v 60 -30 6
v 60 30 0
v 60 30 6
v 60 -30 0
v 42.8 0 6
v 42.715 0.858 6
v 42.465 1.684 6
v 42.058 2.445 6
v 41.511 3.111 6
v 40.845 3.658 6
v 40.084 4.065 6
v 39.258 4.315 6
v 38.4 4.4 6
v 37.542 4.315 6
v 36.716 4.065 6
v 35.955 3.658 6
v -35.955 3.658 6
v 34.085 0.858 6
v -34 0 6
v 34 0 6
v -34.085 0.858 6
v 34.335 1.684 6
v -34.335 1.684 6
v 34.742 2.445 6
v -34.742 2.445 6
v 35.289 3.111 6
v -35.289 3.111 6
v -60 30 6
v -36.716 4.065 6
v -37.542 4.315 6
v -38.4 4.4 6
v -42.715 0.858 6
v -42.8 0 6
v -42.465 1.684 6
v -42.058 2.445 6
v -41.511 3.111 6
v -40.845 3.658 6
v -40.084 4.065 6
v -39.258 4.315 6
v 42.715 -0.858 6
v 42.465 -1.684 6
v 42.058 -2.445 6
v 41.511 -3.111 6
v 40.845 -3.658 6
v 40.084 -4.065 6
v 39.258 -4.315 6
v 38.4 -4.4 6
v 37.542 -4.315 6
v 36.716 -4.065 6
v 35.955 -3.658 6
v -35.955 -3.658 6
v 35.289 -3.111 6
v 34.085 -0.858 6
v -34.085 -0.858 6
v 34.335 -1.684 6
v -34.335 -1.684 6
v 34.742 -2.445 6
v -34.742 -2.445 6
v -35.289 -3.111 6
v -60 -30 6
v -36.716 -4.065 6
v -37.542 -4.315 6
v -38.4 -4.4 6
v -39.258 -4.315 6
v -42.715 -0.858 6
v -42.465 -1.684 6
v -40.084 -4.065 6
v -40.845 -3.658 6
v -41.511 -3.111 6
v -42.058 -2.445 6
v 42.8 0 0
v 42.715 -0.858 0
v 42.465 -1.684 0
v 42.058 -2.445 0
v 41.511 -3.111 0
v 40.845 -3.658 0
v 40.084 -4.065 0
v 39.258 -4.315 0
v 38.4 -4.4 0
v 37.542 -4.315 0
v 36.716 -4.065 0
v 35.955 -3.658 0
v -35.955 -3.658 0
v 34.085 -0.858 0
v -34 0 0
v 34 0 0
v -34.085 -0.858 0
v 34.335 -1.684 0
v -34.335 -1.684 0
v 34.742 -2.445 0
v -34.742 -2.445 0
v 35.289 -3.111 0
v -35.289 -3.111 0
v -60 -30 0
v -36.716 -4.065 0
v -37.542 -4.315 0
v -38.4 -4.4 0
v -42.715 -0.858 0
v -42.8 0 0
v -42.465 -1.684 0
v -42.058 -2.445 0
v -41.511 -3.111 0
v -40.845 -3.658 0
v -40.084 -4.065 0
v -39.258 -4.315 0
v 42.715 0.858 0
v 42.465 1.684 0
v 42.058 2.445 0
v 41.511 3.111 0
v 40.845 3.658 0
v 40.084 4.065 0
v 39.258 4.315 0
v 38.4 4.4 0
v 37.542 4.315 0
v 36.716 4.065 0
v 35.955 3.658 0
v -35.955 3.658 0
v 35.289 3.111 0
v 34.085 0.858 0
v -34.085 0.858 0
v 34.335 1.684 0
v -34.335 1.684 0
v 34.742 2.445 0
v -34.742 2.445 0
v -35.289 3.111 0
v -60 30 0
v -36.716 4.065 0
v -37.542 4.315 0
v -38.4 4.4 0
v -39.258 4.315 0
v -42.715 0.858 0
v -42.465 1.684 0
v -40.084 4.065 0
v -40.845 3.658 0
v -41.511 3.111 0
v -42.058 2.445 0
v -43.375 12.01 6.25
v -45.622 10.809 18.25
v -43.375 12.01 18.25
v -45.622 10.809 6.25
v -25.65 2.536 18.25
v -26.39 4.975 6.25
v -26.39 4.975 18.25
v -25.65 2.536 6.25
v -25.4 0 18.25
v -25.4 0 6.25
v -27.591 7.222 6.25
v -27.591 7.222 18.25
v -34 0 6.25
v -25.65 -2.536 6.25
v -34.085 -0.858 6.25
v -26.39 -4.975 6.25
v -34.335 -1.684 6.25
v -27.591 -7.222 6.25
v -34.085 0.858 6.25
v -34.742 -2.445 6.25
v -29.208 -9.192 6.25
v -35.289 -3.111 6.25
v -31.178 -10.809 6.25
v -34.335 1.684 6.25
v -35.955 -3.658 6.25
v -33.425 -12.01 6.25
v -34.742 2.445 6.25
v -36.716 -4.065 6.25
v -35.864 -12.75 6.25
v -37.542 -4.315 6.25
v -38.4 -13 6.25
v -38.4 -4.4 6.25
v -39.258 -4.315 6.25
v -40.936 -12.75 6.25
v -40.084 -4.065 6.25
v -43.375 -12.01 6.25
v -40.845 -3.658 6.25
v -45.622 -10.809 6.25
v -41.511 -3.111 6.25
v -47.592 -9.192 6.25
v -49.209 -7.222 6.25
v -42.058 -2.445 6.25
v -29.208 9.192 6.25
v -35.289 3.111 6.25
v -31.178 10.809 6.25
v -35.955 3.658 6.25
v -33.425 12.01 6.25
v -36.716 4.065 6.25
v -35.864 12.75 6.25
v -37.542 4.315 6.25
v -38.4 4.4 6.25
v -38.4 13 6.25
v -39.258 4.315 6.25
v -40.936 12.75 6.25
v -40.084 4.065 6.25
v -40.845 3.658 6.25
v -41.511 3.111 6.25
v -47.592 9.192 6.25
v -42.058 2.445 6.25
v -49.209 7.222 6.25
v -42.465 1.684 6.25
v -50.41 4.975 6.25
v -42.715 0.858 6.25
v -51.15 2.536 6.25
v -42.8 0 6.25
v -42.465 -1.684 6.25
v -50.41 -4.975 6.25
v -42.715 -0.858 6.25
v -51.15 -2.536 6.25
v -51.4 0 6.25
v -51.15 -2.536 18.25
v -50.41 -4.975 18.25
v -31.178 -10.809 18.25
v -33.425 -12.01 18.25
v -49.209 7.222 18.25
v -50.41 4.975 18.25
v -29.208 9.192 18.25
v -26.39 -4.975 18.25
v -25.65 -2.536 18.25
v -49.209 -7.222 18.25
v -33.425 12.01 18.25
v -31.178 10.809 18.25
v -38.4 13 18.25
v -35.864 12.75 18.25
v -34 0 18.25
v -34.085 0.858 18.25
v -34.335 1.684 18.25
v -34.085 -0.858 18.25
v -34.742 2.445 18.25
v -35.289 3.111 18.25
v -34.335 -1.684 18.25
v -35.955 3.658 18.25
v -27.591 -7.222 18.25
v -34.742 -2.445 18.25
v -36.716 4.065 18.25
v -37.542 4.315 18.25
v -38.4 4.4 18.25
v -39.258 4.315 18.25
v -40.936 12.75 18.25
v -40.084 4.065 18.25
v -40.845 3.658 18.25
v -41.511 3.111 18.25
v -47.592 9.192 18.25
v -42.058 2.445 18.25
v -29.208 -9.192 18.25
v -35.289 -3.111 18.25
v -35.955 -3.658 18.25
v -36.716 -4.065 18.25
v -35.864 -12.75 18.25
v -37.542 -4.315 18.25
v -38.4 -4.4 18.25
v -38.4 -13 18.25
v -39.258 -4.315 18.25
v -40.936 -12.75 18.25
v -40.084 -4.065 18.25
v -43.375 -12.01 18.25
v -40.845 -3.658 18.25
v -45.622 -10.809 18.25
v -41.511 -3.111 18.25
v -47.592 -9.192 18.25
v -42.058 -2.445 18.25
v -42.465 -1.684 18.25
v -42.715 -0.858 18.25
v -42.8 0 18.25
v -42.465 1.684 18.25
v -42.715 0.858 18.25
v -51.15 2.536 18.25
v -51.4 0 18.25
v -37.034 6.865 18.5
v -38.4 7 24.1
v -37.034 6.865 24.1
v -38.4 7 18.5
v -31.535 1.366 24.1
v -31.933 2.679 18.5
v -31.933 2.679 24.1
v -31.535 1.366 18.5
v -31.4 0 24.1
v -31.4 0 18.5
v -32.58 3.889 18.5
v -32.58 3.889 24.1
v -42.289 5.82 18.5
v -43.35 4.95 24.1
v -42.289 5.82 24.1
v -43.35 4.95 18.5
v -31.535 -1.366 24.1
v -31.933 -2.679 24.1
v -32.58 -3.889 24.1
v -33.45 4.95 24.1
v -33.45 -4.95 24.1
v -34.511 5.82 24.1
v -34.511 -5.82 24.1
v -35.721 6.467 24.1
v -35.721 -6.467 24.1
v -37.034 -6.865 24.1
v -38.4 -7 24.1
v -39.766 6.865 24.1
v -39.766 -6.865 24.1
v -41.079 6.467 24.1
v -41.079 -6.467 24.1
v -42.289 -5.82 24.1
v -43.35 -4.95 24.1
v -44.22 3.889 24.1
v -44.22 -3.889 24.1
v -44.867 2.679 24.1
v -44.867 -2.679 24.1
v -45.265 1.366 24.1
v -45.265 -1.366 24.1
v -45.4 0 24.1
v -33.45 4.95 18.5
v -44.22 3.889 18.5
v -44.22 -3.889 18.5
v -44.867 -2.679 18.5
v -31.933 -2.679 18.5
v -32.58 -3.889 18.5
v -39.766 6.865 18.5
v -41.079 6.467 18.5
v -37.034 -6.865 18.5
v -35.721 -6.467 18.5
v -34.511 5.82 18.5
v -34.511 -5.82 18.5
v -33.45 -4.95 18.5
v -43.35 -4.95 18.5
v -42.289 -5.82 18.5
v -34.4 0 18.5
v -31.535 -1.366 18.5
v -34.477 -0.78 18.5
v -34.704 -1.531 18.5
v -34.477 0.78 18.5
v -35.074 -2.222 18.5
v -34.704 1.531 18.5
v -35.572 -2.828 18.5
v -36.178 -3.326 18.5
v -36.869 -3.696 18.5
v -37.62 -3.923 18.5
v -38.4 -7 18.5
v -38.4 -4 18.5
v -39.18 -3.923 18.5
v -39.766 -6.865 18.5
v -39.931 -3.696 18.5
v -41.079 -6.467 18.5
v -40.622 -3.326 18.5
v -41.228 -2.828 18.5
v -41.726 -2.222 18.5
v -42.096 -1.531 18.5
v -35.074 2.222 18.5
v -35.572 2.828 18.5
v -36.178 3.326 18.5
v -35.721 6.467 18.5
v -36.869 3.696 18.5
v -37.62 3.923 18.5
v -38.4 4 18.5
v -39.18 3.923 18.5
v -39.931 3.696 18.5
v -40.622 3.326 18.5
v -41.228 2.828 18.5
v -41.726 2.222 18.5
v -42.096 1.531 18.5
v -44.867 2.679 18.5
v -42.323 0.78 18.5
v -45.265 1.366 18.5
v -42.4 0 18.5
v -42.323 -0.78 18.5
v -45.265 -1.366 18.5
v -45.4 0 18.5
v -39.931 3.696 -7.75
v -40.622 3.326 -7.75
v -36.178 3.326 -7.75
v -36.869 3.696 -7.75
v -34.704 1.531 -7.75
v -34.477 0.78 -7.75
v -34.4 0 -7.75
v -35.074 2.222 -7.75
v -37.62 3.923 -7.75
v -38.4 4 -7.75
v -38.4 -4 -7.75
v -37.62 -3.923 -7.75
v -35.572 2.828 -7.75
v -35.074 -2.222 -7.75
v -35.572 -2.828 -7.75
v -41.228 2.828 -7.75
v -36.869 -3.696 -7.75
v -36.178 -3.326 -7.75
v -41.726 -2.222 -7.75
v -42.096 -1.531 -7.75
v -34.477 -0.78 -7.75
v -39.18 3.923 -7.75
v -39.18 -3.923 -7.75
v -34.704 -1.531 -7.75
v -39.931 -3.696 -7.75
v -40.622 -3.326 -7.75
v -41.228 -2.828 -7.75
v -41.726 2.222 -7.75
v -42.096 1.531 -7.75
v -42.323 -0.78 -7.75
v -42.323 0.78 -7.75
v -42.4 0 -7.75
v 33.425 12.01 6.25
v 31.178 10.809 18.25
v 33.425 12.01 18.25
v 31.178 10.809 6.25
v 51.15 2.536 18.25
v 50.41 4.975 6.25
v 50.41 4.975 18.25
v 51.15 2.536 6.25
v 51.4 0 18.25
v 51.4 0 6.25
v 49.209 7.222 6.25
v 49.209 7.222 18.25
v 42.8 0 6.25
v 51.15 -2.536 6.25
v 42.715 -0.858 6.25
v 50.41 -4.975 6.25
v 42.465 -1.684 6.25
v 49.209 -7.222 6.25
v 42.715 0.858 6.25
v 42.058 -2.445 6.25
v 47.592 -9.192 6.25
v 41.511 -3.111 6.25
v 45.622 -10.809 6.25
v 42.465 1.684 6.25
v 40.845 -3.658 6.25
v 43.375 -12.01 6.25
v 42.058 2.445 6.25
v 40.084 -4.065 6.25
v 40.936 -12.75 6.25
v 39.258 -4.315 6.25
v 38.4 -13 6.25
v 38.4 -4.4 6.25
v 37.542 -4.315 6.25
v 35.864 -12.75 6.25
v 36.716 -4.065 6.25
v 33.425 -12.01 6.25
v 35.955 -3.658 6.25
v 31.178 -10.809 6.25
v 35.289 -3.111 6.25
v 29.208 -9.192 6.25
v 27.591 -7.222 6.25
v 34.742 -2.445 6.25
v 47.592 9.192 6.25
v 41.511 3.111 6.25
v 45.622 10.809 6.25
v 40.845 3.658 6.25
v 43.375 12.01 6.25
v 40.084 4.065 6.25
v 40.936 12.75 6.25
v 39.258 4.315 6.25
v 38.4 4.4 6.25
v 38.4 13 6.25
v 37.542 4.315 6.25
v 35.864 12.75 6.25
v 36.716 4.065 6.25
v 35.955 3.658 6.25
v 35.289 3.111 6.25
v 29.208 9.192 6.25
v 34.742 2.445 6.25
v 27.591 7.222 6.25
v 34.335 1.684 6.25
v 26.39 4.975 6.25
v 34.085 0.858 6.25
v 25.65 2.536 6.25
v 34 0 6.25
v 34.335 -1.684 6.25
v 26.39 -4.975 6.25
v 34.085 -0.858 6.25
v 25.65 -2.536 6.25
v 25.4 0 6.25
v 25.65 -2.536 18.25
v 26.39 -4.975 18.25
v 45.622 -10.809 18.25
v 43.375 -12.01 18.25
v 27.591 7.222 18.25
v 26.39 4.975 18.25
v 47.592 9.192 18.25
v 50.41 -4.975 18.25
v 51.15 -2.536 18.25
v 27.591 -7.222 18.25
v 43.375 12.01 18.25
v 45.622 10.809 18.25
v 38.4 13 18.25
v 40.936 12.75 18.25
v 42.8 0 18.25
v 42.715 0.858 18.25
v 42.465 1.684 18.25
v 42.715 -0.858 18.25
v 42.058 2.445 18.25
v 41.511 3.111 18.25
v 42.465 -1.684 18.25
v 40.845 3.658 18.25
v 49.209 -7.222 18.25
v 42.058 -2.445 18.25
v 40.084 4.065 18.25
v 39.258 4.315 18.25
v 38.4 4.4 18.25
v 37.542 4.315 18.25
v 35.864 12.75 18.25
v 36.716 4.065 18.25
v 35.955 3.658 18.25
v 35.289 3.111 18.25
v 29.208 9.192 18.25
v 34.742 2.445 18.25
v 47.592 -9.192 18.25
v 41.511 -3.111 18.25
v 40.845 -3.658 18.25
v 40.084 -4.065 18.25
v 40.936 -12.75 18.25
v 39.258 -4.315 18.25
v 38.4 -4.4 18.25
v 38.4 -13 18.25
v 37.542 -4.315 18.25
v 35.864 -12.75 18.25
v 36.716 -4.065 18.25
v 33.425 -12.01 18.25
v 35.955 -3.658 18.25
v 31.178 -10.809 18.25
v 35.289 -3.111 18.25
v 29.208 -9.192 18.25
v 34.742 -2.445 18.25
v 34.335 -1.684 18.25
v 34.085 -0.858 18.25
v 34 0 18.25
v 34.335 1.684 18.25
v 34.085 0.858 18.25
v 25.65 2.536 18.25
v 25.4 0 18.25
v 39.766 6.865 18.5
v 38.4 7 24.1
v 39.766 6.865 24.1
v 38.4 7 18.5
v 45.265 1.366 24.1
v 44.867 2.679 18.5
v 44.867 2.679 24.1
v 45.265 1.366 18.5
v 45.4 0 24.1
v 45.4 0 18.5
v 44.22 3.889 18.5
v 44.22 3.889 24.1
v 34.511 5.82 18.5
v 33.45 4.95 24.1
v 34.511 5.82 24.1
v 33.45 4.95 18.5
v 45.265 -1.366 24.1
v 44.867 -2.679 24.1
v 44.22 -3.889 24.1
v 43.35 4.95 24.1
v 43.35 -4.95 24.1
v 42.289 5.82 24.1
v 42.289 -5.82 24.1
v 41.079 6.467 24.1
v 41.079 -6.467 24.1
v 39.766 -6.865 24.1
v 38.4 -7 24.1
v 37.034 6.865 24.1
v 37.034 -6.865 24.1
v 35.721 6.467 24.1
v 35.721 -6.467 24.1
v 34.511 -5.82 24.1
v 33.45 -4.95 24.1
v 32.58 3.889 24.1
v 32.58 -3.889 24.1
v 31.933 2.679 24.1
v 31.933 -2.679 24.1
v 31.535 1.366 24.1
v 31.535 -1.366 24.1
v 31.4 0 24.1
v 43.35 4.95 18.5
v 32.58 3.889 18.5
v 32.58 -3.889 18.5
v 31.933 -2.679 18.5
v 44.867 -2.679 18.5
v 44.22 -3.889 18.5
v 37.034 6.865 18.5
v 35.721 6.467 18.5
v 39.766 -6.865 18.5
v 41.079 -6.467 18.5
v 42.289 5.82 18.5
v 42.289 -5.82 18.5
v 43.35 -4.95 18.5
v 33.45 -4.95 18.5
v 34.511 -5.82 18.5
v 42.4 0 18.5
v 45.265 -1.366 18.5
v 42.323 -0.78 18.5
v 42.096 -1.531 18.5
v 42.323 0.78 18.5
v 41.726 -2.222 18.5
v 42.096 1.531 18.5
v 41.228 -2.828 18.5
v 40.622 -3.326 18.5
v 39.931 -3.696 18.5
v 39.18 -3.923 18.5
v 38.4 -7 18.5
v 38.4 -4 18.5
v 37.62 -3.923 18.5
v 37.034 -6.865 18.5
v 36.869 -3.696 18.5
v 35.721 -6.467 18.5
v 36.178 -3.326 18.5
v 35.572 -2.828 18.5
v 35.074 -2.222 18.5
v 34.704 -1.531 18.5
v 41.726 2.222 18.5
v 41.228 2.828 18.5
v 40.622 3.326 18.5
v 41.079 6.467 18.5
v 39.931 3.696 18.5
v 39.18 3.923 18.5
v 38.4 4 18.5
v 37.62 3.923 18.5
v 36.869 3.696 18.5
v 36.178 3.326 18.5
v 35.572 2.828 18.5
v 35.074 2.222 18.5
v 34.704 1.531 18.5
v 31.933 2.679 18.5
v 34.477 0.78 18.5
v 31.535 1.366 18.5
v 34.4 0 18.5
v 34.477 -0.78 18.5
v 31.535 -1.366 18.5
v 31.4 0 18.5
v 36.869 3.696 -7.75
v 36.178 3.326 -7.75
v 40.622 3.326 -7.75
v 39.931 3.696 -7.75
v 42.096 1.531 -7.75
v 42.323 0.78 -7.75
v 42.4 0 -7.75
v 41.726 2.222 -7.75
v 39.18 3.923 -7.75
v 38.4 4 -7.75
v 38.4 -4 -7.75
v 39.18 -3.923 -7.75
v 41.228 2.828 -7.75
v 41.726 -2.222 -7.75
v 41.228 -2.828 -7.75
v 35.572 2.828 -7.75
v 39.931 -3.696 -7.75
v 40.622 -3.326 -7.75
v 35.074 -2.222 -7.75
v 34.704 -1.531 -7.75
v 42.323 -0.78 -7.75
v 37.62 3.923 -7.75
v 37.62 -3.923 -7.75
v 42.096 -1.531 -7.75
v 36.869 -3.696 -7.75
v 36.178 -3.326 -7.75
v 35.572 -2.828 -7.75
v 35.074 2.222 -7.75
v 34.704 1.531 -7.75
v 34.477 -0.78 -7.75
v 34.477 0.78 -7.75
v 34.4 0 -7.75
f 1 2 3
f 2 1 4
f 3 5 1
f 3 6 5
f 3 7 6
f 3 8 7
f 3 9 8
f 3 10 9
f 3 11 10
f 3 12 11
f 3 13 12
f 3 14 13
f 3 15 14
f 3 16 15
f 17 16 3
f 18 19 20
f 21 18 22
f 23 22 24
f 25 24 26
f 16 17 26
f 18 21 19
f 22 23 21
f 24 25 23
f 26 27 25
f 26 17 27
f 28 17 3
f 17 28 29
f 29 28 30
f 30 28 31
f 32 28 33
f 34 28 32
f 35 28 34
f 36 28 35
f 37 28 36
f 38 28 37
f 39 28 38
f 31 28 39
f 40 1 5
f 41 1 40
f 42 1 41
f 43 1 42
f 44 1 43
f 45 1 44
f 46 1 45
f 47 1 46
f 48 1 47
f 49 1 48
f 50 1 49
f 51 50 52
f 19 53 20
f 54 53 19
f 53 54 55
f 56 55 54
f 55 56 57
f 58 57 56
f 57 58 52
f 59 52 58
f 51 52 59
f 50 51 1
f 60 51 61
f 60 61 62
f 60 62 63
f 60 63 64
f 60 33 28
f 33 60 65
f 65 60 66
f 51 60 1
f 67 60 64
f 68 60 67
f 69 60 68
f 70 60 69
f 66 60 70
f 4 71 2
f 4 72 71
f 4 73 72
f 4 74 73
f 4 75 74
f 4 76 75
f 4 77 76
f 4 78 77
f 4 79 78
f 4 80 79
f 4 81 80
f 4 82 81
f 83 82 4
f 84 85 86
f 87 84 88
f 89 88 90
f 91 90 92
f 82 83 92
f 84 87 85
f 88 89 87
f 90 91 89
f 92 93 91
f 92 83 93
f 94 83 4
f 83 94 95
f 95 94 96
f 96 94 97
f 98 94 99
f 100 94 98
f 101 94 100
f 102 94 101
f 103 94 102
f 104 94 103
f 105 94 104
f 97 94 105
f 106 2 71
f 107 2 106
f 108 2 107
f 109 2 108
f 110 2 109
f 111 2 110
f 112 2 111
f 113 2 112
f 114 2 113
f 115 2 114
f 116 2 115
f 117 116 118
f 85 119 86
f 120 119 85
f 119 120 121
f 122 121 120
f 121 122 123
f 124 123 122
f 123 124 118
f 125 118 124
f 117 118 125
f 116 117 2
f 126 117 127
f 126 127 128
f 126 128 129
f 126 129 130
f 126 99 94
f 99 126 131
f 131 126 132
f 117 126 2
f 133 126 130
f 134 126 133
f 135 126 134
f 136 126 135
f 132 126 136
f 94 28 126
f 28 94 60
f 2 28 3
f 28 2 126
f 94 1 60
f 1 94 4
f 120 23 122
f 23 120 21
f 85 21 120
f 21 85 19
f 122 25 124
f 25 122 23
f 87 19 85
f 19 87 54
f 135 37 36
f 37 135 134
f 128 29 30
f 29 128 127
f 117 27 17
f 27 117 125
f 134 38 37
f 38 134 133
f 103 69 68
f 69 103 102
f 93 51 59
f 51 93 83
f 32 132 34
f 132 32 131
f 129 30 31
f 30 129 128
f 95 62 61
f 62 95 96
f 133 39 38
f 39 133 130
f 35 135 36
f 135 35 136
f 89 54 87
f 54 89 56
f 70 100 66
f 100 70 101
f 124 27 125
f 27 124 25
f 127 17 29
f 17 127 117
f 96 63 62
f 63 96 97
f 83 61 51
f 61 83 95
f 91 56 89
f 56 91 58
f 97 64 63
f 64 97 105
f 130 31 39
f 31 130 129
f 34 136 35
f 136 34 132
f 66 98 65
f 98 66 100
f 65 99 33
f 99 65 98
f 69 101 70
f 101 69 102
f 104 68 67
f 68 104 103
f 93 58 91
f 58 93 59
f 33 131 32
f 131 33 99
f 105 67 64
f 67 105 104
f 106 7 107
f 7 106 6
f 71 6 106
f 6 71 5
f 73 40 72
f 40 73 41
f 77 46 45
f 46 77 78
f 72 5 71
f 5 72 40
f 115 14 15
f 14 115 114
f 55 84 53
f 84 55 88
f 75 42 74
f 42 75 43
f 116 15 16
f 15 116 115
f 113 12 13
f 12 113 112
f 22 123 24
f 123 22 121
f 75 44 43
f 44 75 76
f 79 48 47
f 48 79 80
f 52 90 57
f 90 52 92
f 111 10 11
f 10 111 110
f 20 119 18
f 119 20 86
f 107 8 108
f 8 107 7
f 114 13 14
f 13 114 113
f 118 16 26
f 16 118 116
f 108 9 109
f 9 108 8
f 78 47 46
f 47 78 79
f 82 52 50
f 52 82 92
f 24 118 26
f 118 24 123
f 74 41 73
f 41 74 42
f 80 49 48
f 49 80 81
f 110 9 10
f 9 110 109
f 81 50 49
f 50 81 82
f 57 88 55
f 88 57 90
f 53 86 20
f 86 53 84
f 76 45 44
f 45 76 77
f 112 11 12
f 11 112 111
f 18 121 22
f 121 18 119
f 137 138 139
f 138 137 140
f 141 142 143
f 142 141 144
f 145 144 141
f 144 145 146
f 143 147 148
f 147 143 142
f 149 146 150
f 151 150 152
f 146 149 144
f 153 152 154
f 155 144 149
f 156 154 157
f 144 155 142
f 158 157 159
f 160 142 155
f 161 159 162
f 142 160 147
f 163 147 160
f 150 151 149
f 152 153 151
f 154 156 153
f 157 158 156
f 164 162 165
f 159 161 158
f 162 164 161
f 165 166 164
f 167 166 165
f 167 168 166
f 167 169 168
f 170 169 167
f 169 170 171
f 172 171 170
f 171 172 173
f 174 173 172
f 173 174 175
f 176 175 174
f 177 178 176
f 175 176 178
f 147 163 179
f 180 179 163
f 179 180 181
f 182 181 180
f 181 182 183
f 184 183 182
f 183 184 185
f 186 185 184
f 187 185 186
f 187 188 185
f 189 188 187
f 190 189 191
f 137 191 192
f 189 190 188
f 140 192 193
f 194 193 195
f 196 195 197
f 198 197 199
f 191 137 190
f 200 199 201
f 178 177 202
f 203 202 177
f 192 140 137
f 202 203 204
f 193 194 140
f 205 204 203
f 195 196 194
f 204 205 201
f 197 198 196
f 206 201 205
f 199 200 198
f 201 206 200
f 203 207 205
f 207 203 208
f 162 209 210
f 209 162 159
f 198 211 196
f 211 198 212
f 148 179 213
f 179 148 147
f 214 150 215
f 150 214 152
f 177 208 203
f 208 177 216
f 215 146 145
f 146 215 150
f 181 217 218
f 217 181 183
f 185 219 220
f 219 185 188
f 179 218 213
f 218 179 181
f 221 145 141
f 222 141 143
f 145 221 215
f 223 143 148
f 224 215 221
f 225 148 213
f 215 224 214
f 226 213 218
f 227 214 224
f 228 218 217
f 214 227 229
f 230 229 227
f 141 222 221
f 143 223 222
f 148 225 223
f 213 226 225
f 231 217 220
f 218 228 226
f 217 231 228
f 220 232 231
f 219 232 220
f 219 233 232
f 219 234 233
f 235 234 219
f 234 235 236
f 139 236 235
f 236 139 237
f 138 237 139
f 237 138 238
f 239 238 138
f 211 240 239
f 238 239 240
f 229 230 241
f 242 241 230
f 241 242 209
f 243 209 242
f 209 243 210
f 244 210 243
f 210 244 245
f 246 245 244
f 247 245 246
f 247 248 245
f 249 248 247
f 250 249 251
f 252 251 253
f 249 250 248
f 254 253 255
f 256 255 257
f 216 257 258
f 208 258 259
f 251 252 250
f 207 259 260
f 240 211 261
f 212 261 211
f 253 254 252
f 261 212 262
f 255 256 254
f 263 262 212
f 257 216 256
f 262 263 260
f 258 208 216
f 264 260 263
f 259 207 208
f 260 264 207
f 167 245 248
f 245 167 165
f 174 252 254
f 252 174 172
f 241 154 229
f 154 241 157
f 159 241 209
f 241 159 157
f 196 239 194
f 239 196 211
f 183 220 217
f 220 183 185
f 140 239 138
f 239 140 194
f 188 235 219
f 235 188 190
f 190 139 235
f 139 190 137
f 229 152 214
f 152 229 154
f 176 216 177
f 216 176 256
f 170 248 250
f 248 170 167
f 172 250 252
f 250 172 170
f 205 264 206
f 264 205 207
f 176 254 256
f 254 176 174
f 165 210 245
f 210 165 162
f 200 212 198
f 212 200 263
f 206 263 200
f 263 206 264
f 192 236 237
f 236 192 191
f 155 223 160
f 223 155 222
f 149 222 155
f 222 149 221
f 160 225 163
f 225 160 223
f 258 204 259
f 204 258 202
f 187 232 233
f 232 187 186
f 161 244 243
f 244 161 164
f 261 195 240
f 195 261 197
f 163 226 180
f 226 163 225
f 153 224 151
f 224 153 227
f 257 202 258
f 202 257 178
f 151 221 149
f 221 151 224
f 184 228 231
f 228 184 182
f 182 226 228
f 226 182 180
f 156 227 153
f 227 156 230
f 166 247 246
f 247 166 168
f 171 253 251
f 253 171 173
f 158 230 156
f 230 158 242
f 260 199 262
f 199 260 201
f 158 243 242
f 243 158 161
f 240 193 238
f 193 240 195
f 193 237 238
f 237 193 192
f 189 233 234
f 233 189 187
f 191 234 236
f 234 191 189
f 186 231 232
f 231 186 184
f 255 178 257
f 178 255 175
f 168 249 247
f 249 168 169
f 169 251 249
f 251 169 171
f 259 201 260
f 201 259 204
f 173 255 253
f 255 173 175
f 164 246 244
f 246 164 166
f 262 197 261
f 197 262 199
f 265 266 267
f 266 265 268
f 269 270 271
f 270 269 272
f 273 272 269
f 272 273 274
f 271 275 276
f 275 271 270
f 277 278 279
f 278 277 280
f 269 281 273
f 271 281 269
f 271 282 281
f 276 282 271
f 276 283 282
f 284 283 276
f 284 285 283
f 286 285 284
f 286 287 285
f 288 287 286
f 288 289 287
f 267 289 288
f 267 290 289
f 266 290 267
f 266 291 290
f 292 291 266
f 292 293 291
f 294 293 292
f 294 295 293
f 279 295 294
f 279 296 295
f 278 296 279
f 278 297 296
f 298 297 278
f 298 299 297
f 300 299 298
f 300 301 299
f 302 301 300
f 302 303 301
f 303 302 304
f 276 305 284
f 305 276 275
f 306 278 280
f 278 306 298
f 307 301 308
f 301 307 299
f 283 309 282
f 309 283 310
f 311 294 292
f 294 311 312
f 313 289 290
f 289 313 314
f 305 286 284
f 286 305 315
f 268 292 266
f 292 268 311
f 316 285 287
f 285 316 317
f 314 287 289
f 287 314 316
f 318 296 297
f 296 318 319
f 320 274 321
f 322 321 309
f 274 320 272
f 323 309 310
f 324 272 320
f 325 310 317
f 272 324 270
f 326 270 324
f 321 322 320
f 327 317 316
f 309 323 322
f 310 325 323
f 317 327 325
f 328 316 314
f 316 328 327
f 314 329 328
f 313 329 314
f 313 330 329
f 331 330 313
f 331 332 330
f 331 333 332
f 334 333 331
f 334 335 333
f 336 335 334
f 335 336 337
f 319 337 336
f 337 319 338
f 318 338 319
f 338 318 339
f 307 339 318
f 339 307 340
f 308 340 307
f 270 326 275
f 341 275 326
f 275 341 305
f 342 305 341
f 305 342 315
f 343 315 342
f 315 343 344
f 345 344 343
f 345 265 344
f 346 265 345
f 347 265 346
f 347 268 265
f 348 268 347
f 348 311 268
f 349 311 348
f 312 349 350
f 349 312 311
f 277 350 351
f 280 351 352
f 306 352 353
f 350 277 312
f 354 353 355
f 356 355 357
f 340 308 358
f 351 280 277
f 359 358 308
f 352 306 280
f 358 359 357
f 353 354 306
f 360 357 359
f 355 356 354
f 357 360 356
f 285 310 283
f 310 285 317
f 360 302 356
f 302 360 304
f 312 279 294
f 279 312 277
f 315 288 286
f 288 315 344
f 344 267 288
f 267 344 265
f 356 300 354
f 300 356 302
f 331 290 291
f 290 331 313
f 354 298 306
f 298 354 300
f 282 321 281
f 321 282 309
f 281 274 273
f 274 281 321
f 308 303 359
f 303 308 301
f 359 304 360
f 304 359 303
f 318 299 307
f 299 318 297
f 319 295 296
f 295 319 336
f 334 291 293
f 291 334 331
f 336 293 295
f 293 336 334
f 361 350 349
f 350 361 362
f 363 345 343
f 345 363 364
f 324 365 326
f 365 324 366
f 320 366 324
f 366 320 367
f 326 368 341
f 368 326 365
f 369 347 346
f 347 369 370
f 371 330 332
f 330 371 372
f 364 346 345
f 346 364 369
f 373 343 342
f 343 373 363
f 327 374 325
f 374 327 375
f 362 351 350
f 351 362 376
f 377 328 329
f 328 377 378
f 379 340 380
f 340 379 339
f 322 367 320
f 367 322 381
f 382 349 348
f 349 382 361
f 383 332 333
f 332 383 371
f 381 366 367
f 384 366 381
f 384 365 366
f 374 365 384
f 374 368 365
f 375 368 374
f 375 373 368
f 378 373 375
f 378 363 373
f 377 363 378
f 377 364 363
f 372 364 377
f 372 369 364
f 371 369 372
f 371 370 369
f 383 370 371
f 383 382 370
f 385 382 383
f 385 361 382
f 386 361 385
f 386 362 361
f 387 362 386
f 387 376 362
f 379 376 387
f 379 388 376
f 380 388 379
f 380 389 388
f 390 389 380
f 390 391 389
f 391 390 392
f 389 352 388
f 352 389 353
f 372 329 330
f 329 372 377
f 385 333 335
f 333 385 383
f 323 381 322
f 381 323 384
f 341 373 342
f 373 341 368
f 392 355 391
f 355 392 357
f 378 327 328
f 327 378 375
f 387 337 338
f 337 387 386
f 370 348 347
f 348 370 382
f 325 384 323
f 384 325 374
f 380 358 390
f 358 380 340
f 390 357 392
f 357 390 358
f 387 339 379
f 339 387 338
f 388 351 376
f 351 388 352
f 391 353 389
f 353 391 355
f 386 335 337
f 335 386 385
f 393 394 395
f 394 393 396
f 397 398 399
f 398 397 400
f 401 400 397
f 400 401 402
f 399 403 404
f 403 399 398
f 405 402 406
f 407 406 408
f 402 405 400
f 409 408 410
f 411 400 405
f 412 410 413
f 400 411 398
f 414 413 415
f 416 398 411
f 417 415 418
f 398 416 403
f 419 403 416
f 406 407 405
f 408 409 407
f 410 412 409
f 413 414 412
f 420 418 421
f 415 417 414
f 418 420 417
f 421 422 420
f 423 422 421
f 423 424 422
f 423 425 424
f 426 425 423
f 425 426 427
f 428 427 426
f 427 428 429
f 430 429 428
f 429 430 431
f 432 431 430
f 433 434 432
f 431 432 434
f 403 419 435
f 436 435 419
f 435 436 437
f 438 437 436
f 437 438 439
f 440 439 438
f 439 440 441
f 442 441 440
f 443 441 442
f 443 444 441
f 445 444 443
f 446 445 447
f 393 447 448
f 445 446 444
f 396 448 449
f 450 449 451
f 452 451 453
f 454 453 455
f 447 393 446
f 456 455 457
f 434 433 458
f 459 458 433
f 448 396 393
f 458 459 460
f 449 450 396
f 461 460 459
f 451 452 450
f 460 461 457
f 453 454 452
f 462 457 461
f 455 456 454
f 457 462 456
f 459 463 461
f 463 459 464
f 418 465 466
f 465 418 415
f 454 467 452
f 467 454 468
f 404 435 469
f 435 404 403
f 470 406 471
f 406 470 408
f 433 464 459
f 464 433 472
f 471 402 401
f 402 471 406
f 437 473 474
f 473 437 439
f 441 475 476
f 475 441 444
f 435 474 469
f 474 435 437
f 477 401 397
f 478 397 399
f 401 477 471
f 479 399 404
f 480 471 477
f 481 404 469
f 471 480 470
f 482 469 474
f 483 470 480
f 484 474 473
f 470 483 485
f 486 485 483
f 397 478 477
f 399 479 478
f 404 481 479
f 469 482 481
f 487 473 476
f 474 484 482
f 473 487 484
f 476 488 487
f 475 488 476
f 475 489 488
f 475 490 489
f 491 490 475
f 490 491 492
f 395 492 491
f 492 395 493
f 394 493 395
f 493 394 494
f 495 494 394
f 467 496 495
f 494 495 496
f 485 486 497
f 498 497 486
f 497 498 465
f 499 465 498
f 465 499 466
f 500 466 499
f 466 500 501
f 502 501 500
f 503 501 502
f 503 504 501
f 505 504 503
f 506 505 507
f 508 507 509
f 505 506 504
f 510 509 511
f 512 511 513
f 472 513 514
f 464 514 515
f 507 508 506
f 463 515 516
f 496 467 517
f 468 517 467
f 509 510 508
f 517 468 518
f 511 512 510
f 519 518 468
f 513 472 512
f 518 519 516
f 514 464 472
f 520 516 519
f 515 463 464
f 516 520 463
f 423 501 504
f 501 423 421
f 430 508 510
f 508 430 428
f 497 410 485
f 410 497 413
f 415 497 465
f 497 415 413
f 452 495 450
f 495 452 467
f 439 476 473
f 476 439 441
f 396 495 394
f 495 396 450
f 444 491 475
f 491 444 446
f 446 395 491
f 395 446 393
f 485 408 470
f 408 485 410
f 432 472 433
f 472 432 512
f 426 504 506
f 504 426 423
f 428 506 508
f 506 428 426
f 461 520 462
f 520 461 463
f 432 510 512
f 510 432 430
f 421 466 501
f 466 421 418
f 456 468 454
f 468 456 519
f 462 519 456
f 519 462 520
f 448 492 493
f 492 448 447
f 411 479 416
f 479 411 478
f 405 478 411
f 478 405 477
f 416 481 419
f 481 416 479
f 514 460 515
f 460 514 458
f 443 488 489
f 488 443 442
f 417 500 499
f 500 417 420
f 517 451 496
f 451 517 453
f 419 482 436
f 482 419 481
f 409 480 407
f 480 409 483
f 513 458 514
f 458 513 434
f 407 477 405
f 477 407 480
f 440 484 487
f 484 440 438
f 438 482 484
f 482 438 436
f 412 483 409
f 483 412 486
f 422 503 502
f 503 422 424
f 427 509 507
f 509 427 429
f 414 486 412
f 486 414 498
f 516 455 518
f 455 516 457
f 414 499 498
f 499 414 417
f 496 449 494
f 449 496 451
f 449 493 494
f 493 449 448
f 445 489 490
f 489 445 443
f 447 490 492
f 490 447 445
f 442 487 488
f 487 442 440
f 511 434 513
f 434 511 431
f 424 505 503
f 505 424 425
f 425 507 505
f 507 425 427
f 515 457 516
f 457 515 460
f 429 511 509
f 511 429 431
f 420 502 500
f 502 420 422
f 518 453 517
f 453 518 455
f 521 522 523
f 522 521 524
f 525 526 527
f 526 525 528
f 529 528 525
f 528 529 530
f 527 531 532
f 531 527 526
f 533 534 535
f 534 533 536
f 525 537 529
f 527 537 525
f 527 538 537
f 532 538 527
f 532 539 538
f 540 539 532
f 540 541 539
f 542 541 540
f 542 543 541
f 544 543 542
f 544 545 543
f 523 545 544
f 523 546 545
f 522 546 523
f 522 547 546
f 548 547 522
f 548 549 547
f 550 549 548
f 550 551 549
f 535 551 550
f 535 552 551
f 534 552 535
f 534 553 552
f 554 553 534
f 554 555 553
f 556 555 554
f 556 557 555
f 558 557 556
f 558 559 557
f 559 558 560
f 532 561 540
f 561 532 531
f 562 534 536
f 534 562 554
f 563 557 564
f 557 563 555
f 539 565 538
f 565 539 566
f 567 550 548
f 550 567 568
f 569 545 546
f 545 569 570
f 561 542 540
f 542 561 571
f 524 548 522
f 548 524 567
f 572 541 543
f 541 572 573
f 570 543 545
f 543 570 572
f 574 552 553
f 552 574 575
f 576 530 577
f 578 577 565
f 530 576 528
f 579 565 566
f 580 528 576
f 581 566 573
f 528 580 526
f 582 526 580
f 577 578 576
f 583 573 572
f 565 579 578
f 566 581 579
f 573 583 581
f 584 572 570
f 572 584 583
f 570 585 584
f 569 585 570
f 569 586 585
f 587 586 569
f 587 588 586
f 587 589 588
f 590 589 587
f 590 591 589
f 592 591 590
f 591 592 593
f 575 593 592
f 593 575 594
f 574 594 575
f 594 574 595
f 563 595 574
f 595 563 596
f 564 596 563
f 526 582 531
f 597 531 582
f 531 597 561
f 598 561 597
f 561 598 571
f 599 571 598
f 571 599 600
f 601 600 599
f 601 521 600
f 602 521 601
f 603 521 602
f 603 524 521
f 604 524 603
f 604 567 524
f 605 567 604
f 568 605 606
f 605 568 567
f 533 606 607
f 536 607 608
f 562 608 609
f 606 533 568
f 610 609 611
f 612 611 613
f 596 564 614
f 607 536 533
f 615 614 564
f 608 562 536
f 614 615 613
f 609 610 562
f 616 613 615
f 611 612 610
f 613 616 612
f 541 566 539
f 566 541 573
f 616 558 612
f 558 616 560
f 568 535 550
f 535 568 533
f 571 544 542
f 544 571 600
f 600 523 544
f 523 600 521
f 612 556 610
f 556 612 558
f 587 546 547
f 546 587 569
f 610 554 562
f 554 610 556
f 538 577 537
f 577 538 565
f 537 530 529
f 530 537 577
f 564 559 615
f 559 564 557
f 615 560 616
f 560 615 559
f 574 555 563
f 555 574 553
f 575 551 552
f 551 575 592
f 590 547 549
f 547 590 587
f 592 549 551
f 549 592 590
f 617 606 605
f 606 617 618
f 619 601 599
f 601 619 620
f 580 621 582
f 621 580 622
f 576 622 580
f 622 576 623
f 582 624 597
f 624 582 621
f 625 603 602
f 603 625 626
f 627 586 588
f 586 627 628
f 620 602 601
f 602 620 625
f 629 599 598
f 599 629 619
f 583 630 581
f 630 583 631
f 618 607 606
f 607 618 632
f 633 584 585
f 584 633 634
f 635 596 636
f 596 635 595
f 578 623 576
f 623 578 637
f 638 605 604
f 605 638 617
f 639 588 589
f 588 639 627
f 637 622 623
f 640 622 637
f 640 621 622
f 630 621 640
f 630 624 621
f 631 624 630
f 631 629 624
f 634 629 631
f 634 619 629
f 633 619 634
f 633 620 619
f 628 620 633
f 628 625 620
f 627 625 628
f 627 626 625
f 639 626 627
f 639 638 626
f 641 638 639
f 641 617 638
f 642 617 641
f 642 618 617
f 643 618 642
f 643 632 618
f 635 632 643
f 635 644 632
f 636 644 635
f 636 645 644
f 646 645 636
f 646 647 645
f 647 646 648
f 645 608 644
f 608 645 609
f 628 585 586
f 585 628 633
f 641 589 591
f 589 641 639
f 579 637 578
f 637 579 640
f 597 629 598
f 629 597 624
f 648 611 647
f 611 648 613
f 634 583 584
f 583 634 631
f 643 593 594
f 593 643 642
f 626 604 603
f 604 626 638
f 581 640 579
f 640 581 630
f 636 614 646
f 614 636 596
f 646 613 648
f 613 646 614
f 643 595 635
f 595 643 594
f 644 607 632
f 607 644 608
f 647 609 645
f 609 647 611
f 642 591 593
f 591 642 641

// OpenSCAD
$fn = 32;

// ------------------------------------------------------------------------
// Standoff columns: 2 d26 standoffs, bolts d8
// Every part is its own module, assembly() places them once.
// ------------------------------------------------------------------------

// --- part 1 ---
module base_plate() {
  difference() {
    translate([-60, -30, 0]) cube([120, 60, 6]);
    translate([-38.4, 0, -1]) cylinder(h = 8, d = 8.8);
    translate([38.4, 0, -1]) cylinder(h = 8, d = 8.8);
  }
}

// --- part 2 ---
module spacer1() {
  difference() {
      translate([0, 0, 0]) cylinder(h = 12, d = 26);
      translate([0, 0, -1]) cylinder(h = 14, d = 8.8);
    }
}

// --- part 3 ---
module bolt1() {
  cylinder(h = 5.6, d = 14);
  translate([0, 0, -26.25]) cylinder(h = 26.25, d = 8);
}

// --- part 4 ---
module spacer2() {
  difference() {
      translate([0, 0, 0]) cylinder(h = 12, d = 26);
      translate([0, 0, -1]) cylinder(h = 14, d = 8.8);
    }
}

// --- part 5 ---
module bolt2() {
  cylinder(h = 5.6, d = 14);
  translate([0, 0, -26.25]) cylinder(h = 26.25, d = 8);
}

// --- assembly ---
module assembly() {
  translate([0, 0, 0]) rotate([0, 0, 0]) base_plate();
  translate([-38.4, 0, 6.25]) rotate([0, 0, 0]) spacer1();
  translate([-38.4, 0, 18.5]) rotate([0, 0, 0]) bolt1();
  translate([38.4, 0, 6.25]) rotate([0, 0, 0]) spacer2();
  translate([38.4, 0, 18.5]) rotate([0, 0, 0]) bolt2();
}

assembly();
